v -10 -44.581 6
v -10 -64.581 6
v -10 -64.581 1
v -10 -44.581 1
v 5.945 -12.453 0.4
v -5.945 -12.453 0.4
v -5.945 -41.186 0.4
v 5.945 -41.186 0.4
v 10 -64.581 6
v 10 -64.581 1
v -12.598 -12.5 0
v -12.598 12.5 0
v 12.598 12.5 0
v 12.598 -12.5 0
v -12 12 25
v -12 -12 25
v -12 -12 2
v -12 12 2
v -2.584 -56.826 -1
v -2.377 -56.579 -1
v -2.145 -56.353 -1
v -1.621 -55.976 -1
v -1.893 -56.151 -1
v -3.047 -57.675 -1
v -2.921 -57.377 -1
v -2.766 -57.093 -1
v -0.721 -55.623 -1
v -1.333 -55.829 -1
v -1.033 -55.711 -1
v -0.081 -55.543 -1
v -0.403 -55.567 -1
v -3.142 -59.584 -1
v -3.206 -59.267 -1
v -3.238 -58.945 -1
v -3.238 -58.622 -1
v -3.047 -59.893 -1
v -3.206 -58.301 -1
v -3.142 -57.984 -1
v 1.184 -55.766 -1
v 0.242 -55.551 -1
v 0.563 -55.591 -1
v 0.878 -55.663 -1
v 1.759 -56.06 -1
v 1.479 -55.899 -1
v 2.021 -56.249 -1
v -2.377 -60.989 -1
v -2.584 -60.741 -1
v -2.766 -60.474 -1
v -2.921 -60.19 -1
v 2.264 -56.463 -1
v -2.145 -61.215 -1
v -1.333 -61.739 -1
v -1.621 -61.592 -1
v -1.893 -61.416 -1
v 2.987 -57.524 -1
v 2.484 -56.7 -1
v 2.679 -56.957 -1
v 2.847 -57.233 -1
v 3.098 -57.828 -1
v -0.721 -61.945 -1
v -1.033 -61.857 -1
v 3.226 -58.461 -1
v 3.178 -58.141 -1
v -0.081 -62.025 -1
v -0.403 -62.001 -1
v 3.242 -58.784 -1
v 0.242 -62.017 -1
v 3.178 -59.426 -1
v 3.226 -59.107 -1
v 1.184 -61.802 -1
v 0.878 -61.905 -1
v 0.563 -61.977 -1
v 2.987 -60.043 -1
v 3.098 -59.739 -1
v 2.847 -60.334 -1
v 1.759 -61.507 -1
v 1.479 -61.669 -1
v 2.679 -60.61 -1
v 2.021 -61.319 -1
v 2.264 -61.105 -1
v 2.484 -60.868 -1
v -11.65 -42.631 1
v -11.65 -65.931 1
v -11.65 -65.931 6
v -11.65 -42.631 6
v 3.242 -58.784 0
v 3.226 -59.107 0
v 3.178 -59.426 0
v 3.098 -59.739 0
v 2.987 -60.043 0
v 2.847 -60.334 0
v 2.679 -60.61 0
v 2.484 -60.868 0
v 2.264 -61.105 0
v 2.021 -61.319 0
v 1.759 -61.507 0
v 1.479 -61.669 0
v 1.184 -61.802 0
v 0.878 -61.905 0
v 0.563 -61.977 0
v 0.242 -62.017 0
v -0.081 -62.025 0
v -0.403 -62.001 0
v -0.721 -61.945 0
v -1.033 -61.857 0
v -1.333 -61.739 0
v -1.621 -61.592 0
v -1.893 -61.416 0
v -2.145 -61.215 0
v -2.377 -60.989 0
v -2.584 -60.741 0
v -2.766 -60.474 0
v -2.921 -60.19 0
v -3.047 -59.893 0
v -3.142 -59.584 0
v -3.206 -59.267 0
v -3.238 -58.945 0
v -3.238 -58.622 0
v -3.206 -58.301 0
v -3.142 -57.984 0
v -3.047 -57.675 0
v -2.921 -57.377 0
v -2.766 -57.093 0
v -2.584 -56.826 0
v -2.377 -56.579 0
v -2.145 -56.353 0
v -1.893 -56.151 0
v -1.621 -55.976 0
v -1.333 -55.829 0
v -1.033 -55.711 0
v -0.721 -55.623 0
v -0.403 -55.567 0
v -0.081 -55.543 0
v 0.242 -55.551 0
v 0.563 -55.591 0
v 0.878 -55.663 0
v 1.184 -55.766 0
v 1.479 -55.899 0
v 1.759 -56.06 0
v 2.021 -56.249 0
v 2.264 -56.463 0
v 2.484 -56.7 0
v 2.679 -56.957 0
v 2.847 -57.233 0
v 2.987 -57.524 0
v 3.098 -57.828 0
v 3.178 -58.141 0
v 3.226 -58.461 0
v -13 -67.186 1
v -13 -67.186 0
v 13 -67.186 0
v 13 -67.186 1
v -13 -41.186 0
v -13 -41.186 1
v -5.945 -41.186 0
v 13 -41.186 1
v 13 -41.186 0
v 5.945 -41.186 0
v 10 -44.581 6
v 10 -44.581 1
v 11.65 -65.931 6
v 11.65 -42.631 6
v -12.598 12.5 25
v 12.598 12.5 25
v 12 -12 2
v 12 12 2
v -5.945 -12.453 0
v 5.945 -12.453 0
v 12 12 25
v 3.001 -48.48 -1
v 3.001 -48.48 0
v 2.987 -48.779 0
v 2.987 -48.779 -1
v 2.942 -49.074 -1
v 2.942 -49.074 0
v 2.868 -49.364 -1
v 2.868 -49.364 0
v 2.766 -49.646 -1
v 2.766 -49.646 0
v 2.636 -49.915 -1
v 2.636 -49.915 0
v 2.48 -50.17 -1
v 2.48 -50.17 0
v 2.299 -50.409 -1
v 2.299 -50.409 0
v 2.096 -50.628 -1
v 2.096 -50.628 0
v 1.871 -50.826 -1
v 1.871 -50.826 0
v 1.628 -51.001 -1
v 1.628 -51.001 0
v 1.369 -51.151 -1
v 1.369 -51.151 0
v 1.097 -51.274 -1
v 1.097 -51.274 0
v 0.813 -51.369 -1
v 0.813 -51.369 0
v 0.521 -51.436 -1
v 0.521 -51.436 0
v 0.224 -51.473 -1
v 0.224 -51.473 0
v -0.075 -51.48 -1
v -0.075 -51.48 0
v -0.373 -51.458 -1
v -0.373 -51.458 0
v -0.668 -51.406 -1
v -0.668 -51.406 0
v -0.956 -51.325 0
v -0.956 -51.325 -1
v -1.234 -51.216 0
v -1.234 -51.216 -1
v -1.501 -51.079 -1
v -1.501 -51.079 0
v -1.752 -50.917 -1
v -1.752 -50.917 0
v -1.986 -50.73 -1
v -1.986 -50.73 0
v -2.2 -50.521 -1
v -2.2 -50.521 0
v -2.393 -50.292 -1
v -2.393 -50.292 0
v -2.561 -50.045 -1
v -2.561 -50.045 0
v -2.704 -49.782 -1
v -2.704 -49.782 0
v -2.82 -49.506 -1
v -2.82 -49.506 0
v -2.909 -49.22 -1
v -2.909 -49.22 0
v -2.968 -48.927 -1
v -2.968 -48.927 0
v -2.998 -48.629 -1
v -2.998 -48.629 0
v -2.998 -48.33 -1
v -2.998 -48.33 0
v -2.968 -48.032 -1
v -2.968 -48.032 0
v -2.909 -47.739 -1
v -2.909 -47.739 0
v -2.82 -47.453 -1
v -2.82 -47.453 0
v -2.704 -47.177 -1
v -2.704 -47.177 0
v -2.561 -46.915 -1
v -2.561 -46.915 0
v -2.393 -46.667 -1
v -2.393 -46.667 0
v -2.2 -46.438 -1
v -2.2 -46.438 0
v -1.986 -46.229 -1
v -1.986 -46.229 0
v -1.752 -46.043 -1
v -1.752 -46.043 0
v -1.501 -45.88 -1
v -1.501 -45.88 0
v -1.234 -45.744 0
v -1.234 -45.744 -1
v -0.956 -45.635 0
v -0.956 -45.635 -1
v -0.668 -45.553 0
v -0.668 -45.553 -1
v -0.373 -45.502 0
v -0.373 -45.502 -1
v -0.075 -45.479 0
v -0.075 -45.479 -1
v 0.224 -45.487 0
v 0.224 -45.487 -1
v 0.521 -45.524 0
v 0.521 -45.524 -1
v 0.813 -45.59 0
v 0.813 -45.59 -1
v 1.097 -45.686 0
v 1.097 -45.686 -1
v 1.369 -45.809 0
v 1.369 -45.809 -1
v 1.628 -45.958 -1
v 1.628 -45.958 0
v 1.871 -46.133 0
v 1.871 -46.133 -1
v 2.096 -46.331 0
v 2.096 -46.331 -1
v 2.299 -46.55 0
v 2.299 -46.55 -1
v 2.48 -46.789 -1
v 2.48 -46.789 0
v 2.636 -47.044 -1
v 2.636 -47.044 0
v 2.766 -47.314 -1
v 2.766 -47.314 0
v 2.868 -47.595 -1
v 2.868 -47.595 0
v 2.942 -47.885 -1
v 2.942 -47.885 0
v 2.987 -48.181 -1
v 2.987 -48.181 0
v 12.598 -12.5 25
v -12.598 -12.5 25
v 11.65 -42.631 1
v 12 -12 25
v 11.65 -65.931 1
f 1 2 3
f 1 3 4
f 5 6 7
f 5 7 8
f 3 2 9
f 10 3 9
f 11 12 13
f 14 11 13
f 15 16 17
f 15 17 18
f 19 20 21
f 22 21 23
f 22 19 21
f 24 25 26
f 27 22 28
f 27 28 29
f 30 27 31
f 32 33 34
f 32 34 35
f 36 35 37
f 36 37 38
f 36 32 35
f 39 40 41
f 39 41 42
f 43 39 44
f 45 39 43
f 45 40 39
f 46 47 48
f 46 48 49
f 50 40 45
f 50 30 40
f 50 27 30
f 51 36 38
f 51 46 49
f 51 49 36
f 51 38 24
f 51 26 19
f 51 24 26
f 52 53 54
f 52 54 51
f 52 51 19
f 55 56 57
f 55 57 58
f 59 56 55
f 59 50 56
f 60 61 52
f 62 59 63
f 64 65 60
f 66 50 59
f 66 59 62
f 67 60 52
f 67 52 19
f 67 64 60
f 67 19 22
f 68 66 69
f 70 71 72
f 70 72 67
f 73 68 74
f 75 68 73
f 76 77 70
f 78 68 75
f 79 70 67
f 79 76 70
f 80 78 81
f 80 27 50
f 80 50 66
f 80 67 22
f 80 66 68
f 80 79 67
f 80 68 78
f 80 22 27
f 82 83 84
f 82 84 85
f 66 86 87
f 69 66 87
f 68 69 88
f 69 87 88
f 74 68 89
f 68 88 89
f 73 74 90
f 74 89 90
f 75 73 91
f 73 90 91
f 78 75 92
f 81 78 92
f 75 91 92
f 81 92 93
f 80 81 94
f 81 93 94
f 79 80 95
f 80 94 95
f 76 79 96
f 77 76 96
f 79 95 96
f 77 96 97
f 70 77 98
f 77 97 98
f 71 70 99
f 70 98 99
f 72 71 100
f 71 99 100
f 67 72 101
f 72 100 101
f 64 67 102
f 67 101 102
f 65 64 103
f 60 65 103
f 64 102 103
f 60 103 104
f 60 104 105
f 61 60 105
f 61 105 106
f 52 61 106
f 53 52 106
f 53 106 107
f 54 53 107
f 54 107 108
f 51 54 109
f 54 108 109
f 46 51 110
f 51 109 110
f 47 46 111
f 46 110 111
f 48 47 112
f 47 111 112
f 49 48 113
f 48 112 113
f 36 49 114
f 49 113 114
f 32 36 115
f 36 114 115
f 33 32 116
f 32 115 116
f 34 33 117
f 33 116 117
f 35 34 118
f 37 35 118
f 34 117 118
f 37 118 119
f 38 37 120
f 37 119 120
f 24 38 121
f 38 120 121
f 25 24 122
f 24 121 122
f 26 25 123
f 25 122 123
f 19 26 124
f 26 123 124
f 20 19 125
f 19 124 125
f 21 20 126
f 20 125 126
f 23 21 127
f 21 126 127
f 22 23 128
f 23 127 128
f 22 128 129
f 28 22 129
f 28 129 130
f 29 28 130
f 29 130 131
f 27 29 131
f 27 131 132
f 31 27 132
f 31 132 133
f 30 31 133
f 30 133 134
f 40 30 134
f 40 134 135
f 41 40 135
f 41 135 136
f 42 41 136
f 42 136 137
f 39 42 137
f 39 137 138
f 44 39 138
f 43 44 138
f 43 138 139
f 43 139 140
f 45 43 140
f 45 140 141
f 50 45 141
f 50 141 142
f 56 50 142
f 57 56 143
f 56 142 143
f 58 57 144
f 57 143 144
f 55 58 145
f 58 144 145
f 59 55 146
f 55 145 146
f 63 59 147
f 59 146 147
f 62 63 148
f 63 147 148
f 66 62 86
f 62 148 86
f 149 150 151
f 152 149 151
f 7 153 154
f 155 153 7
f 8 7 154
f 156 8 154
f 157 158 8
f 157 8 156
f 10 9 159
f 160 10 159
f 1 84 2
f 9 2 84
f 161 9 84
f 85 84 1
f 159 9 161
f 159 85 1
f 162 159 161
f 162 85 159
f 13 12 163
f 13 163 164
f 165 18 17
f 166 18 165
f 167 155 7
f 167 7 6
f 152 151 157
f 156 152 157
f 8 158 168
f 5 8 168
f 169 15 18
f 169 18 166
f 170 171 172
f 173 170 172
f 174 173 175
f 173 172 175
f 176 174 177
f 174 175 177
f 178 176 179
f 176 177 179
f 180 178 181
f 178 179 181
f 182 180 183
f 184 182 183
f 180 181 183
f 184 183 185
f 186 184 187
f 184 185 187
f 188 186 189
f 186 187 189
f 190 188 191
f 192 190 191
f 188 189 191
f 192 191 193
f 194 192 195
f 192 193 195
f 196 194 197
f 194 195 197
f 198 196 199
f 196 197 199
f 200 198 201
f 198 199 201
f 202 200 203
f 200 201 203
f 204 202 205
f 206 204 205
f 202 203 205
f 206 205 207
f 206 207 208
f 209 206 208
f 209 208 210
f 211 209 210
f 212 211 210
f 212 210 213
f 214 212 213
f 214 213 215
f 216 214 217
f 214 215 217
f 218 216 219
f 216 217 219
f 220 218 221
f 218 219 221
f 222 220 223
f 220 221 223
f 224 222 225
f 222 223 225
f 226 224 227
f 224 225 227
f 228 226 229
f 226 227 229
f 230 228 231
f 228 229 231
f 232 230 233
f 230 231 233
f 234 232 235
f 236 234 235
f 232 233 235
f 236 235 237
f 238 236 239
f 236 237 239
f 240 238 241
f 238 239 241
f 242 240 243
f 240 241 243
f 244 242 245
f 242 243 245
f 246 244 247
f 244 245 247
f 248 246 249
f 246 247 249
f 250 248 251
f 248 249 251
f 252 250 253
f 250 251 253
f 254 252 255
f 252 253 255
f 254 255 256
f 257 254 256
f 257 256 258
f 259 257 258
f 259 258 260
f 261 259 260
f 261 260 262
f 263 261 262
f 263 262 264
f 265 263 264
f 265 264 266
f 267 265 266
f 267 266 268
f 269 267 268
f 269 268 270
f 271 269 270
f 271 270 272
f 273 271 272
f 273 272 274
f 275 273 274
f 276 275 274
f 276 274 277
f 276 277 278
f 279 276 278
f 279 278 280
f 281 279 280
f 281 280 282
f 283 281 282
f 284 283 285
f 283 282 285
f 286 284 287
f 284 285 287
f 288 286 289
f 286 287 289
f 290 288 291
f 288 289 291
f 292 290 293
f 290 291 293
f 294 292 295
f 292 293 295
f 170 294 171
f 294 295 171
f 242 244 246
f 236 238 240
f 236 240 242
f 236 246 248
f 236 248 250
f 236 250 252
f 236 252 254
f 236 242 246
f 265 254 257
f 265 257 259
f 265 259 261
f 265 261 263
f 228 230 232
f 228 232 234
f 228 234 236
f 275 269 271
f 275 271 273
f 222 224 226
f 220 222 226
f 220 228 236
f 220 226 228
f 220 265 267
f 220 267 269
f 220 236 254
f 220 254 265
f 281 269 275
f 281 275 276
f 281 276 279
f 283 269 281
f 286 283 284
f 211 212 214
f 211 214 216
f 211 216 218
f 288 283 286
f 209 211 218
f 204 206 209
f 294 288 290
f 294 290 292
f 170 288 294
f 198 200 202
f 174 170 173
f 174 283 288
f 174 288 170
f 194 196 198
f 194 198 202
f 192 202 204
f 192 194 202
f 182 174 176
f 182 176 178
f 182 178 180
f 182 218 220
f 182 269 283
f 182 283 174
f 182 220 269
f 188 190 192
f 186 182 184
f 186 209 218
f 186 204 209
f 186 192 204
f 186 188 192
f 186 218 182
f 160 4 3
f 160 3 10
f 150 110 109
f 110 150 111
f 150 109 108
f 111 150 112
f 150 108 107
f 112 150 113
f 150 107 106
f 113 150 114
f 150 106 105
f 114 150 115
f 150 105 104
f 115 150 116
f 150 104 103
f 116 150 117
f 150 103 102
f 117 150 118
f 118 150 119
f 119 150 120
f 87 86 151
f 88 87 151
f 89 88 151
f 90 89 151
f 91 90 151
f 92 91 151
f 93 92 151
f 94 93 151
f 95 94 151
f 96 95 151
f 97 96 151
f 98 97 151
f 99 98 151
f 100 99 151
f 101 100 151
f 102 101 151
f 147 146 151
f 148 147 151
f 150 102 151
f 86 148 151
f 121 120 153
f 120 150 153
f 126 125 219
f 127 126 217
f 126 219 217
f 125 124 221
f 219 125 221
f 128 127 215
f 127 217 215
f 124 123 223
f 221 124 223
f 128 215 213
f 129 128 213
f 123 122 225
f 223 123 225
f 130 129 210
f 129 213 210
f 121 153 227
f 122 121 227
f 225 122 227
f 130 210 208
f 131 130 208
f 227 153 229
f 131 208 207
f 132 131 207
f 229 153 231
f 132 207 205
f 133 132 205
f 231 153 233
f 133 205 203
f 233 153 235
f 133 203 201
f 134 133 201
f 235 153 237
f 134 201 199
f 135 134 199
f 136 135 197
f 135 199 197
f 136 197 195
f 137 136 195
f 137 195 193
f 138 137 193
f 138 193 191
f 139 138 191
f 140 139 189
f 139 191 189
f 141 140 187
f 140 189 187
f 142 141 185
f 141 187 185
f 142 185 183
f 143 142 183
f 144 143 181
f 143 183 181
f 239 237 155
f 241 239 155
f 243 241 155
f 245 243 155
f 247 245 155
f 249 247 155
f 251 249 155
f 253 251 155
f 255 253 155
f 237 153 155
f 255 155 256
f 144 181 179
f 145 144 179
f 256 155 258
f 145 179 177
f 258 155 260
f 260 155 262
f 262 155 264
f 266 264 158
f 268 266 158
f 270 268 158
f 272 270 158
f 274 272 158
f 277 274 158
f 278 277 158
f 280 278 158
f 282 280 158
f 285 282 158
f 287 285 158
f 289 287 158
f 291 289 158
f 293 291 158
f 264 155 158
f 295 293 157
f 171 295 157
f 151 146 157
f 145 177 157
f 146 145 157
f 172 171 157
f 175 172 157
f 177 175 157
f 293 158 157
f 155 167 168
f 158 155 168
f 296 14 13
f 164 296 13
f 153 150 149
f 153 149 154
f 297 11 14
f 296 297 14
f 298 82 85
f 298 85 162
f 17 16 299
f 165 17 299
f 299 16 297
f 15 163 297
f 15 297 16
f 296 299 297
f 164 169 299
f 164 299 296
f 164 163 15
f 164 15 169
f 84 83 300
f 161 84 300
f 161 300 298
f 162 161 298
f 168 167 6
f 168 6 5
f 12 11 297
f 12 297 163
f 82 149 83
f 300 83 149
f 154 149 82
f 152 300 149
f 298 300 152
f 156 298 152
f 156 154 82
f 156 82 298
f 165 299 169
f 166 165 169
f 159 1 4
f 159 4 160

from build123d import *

# Parameters (mm, degrees)
F0_W      = 25.195038
F0_H      = 25
F2_DEPTH  = 25
F3_W      = 24
F3_H      = 24
F4_DEPTH  = 23
F1_W      = 11.88971
F1_H      = 34.151009
F5_DEPTH  = 0.4
F6_W      = 26
F6_H      = 26
F7_DEPTH  = 1
F8_W      = 23.3
F8_H      = 23.3
F9_DEPTH  = 5
F10_W     = 20
F10_H     = 20
F11_DEPTH = 5
F12_R     = 3.001446
F12_R_2   = 3.242055
F13_DEPTH = 1


with BuildPart() as f2:
    # F0 (on Top) → F2 (new body)
    with BuildSketch(Plane.XY):
        Rectangle(F0_W, F0_H)
    extrude(amount=F2_DEPTH)

    # F3 (on face) → F4 (cut)
    with BuildSketch(Plane.XY.offset(25)):
        Rectangle(F3_W, F3_H)
    extrude(amount=-F4_DEPTH, mode=Mode.SUBTRACT)


with BuildPart() as f5:
    # F1 (on Top) → F5 (new body)
    with BuildSketch(Plane.XY):
        with Locations((0, -29.528086)):
            Rectangle(F1_W, F1_H)
    extrude(amount=F5_DEPTH)

    # F6 (on Top) → F7 (join)
    with BuildSketch(Plane.XY):
        with Locations((0, -54.186432)):
            Rectangle(F6_W, F6_H)
    extrude(amount=F7_DEPTH)

    # F8 (on face) → F9 (join)
    with BuildSketch(Plane.XY.offset(1)):
        with Locations((0, -54.281339)):
            Rectangle(F8_W, F8_H)
    extrude(amount=F9_DEPTH)

    # F10 (on face) → F11 (cut)
    with BuildSketch(Plane.XY.offset(6)):
        with Locations((0, -54.580884)):
            Rectangle(F10_W, F10_H)
    extrude(amount=-F11_DEPTH, mode=Mode.SUBTRACT)

    # F12 (on face) → F13 (join)
    with BuildSketch(Plane(origin=(0, 0, 0), x_dir=(1, 0, 0), z_dir=(0, 0, -1))):
        with Locations((0, 48.479673)):
            Circle(F12_R)
        with Locations((0, 58.783803)):
            Circle(F12_R_2)
    extrude(amount=F13_DEPTH)


solid = Compound([f2.part, f5.part])
